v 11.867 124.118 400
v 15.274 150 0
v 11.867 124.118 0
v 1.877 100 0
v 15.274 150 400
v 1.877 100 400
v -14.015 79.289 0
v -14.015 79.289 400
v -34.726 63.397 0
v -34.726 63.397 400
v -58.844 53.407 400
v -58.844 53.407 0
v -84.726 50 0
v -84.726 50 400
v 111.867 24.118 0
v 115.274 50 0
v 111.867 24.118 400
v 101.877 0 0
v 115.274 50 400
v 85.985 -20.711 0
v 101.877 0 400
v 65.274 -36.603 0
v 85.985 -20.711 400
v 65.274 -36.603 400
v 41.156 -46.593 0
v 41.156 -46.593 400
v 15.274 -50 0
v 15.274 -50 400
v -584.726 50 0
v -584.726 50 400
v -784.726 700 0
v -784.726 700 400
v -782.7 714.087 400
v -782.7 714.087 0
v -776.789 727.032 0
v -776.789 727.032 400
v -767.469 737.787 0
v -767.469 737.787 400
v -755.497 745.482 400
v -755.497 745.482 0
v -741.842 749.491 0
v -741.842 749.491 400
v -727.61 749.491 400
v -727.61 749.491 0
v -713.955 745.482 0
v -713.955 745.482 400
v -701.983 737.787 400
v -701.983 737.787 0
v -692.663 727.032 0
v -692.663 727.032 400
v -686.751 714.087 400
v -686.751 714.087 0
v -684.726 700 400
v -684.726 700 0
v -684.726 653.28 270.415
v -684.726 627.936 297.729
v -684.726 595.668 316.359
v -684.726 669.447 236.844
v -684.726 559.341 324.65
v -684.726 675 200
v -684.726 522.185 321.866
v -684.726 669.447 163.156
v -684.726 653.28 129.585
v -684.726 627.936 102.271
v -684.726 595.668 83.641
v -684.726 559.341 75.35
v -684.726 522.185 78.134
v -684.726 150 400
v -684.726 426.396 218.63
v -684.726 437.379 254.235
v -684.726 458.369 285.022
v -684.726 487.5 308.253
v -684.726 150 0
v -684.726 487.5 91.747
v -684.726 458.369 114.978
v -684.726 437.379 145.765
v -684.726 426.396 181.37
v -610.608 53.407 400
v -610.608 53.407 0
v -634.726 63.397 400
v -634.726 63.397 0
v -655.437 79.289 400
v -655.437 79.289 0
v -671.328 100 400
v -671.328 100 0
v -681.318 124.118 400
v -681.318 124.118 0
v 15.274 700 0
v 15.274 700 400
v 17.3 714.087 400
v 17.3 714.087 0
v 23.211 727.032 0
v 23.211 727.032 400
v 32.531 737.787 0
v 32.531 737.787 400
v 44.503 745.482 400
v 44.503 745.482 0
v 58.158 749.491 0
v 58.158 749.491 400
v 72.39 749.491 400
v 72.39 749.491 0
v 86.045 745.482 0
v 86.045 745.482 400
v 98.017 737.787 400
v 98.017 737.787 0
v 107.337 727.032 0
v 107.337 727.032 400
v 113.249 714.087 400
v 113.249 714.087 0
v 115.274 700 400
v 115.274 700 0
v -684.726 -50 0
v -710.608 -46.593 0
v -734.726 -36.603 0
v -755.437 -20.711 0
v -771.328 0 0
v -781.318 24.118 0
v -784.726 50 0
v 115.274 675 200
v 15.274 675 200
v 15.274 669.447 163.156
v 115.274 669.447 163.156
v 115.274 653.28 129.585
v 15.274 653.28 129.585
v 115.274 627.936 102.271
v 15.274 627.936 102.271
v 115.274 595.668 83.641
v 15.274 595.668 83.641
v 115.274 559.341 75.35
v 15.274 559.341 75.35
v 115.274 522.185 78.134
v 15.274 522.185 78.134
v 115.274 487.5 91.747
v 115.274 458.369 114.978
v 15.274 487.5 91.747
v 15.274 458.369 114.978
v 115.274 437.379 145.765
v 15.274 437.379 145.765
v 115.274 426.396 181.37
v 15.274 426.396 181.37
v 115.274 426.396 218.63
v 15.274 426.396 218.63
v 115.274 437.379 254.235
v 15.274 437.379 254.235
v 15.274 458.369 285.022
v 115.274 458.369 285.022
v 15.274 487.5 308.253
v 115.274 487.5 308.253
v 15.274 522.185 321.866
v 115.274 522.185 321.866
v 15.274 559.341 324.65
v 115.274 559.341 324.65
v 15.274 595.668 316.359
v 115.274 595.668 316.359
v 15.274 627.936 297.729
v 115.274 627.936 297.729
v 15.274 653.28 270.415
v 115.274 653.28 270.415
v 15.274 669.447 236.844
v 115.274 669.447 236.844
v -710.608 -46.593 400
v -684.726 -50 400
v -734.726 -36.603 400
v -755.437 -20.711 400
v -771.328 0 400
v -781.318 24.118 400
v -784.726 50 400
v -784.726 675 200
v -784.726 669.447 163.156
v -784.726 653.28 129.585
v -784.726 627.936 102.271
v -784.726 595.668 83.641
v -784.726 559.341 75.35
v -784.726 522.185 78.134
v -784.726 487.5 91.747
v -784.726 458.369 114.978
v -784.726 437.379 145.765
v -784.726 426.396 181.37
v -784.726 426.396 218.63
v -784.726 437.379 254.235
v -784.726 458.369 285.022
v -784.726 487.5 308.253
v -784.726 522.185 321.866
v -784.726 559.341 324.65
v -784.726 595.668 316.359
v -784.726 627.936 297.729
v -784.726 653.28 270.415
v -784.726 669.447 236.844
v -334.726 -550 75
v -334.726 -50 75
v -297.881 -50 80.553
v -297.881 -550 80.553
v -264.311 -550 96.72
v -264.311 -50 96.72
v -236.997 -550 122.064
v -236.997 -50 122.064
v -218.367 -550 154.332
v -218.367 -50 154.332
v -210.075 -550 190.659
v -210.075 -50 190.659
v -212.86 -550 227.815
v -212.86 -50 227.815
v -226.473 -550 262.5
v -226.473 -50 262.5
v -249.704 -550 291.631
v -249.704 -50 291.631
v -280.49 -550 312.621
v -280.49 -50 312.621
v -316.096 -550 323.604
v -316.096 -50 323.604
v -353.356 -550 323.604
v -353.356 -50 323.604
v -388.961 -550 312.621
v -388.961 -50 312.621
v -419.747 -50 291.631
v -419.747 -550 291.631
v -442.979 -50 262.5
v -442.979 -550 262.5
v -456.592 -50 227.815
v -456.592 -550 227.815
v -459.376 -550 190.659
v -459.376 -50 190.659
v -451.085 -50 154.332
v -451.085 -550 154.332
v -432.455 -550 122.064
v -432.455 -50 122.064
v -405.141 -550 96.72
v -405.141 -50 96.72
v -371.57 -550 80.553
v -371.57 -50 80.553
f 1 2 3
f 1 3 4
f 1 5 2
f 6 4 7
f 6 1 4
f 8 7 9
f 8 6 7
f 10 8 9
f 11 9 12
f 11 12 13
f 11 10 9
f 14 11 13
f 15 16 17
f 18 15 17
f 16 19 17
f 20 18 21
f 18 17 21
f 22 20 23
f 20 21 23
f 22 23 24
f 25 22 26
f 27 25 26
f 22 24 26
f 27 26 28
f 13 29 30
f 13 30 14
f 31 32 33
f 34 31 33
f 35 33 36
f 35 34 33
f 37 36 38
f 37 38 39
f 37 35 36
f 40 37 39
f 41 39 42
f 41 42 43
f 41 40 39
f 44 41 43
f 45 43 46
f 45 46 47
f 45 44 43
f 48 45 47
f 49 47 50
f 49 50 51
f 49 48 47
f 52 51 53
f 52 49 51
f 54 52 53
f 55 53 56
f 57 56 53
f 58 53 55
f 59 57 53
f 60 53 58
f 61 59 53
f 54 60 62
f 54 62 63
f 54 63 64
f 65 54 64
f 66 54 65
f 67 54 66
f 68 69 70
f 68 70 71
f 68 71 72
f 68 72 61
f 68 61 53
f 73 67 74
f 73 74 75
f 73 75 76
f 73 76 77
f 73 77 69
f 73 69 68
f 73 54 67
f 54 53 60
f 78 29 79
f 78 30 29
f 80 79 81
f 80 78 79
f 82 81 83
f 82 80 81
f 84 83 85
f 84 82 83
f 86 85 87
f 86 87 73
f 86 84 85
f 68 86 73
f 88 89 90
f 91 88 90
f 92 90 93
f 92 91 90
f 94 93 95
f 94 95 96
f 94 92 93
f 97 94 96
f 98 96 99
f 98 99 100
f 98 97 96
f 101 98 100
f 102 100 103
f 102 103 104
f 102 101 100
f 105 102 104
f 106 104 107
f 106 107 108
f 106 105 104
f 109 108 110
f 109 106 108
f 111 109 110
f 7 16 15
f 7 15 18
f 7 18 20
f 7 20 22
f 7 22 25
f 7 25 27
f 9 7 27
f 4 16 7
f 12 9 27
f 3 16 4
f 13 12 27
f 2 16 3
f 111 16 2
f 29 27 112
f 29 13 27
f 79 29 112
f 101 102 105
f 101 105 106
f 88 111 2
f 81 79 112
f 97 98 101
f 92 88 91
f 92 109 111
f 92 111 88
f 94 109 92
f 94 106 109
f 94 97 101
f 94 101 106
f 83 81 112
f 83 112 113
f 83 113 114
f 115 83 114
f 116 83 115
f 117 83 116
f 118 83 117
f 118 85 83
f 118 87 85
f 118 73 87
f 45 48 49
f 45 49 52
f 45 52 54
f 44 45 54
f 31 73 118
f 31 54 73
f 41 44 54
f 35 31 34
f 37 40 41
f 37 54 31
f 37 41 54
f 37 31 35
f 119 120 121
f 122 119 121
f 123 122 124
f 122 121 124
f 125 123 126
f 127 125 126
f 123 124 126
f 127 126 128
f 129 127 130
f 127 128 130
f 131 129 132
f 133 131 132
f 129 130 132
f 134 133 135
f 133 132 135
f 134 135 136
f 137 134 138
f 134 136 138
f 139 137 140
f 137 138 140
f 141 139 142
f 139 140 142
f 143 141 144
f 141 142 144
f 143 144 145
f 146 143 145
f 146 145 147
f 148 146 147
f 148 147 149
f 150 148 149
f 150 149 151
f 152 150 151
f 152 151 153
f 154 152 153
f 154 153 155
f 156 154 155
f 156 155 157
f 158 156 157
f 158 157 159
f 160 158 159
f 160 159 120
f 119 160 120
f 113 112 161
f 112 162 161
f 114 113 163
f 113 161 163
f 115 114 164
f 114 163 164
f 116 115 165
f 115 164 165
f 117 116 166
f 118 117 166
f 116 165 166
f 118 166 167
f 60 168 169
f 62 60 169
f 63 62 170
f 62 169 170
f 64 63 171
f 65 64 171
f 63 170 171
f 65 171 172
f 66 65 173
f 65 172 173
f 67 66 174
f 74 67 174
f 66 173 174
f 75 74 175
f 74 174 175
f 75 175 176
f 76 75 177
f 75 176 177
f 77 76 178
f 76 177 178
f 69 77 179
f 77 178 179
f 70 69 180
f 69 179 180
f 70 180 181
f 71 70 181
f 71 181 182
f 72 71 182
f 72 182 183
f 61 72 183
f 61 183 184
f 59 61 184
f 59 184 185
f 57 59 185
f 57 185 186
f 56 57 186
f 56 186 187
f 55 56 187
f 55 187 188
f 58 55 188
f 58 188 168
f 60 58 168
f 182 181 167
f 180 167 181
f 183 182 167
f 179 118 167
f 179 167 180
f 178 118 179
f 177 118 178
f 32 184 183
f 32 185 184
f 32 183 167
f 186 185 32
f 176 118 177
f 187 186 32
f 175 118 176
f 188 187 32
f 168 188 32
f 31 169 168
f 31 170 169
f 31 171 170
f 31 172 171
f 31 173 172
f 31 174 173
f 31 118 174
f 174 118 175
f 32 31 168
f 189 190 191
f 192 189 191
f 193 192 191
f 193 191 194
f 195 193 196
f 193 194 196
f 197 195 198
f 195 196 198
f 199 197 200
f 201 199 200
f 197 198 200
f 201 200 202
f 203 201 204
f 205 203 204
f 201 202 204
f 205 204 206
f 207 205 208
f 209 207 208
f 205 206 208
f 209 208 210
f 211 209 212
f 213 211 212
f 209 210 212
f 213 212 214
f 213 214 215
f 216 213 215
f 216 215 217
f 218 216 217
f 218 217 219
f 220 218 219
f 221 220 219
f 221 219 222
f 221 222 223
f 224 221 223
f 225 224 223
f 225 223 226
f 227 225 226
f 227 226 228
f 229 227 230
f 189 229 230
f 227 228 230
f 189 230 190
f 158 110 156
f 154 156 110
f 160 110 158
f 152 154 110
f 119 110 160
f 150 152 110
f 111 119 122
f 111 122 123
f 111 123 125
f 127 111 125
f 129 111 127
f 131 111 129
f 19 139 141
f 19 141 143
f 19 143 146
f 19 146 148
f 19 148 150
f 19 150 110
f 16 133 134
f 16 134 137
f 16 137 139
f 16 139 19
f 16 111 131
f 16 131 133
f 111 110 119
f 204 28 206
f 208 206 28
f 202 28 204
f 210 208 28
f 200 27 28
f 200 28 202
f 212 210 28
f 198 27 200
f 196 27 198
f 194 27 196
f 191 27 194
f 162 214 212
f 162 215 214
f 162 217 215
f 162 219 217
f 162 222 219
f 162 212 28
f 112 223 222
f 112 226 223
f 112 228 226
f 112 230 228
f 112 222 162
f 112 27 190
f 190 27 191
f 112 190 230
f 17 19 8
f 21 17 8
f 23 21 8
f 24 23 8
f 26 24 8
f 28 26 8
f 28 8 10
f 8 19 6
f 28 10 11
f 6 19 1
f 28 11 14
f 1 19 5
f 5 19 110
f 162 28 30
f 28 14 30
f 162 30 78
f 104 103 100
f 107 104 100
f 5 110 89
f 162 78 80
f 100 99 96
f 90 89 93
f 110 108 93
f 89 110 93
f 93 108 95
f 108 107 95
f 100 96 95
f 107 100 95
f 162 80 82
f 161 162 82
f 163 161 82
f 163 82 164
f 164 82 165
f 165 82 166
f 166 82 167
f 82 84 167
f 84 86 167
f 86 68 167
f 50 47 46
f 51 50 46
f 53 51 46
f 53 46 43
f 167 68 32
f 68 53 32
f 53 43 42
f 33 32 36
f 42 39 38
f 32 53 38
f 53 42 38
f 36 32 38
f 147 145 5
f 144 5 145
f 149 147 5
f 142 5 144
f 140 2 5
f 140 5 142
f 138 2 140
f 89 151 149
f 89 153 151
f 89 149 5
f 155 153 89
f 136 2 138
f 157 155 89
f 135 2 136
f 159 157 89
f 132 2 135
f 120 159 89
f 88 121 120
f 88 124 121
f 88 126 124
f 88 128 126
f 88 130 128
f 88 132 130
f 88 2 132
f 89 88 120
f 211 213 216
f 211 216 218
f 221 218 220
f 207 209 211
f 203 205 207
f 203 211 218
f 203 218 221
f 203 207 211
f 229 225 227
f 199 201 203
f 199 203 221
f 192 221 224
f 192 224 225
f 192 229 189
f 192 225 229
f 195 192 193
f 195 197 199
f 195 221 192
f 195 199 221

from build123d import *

# Parameters (mm, degrees)
BOSS_EXTRUDE1_DEPTH = 400
SKETCH3_R           = 125
BOSS_EXTRUDE2_DEPTH = 500
FILLET1_R           = 100
SKETCH5_R           = 125
CUT_EXTRUDE1_DEPTH  = 2046


with BuildPart() as part:
    # Sketch1 → Boss-Extrude1 (new body)
    with BuildSketch(Plane.XY):
        with BuildLine():
            Line((15.274151436, 50), (15.274151436, 700))
            ThreePointArc((15.274151436, 700), (65.274151436, 750), (115.274151436, 700))
            Line((115.274151436, 700), (115.274151436, -50))
            Line((115.274151436, -50), (-784.725848564, -50))
            Line((-784.725848564, -50), (-784.725848564, 700))
            ThreePointArc((-784.725848564, 700), (-734.725848564, 750), (-684.725848564, 700))
            Line((-684.725848564, 700), (-684.725848564, 50))
            Line((-684.725848564, 50), (15.274151436, 50))
        make_face()
    extrude(amount=BOSS_EXTRUDE1_DEPTH)

    # Sketch3 → Boss-Extrude2 (add)
    with BuildSketch(Plane.XZ.offset(50)):
        with Locations(Location((-334.725848564, 200, 0), (0, 0, 270))):
            Circle(SKETCH3_R)
    extrude(amount=BOSS_EXTRUDE2_DEPTH)

    # Fillet1
    fillet1_edges = [part.edges().sort_by_distance(p)[0] for p in [
        (15.274151436, 50, 200),
        (115.274151436, -50, 200),
        (-784.725848564, -50, 200),
        (-684.725848564, 50, 200),
    ]]
    fillet(fillet1_edges, radius=FILLET1_R)

    # Sketch5 → Cut-Extrude1 (cut)
    with BuildSketch(Plane.ZY.offset(784.725848564)):
        with Locations(Location((200, 550, 0), (0, 0, 90))):
            Circle(SKETCH5_R)
    extrude(amount=-CUT_EXTRUDE1_DEPTH, mode=Mode.SUBTRACT)


solid = part.part
